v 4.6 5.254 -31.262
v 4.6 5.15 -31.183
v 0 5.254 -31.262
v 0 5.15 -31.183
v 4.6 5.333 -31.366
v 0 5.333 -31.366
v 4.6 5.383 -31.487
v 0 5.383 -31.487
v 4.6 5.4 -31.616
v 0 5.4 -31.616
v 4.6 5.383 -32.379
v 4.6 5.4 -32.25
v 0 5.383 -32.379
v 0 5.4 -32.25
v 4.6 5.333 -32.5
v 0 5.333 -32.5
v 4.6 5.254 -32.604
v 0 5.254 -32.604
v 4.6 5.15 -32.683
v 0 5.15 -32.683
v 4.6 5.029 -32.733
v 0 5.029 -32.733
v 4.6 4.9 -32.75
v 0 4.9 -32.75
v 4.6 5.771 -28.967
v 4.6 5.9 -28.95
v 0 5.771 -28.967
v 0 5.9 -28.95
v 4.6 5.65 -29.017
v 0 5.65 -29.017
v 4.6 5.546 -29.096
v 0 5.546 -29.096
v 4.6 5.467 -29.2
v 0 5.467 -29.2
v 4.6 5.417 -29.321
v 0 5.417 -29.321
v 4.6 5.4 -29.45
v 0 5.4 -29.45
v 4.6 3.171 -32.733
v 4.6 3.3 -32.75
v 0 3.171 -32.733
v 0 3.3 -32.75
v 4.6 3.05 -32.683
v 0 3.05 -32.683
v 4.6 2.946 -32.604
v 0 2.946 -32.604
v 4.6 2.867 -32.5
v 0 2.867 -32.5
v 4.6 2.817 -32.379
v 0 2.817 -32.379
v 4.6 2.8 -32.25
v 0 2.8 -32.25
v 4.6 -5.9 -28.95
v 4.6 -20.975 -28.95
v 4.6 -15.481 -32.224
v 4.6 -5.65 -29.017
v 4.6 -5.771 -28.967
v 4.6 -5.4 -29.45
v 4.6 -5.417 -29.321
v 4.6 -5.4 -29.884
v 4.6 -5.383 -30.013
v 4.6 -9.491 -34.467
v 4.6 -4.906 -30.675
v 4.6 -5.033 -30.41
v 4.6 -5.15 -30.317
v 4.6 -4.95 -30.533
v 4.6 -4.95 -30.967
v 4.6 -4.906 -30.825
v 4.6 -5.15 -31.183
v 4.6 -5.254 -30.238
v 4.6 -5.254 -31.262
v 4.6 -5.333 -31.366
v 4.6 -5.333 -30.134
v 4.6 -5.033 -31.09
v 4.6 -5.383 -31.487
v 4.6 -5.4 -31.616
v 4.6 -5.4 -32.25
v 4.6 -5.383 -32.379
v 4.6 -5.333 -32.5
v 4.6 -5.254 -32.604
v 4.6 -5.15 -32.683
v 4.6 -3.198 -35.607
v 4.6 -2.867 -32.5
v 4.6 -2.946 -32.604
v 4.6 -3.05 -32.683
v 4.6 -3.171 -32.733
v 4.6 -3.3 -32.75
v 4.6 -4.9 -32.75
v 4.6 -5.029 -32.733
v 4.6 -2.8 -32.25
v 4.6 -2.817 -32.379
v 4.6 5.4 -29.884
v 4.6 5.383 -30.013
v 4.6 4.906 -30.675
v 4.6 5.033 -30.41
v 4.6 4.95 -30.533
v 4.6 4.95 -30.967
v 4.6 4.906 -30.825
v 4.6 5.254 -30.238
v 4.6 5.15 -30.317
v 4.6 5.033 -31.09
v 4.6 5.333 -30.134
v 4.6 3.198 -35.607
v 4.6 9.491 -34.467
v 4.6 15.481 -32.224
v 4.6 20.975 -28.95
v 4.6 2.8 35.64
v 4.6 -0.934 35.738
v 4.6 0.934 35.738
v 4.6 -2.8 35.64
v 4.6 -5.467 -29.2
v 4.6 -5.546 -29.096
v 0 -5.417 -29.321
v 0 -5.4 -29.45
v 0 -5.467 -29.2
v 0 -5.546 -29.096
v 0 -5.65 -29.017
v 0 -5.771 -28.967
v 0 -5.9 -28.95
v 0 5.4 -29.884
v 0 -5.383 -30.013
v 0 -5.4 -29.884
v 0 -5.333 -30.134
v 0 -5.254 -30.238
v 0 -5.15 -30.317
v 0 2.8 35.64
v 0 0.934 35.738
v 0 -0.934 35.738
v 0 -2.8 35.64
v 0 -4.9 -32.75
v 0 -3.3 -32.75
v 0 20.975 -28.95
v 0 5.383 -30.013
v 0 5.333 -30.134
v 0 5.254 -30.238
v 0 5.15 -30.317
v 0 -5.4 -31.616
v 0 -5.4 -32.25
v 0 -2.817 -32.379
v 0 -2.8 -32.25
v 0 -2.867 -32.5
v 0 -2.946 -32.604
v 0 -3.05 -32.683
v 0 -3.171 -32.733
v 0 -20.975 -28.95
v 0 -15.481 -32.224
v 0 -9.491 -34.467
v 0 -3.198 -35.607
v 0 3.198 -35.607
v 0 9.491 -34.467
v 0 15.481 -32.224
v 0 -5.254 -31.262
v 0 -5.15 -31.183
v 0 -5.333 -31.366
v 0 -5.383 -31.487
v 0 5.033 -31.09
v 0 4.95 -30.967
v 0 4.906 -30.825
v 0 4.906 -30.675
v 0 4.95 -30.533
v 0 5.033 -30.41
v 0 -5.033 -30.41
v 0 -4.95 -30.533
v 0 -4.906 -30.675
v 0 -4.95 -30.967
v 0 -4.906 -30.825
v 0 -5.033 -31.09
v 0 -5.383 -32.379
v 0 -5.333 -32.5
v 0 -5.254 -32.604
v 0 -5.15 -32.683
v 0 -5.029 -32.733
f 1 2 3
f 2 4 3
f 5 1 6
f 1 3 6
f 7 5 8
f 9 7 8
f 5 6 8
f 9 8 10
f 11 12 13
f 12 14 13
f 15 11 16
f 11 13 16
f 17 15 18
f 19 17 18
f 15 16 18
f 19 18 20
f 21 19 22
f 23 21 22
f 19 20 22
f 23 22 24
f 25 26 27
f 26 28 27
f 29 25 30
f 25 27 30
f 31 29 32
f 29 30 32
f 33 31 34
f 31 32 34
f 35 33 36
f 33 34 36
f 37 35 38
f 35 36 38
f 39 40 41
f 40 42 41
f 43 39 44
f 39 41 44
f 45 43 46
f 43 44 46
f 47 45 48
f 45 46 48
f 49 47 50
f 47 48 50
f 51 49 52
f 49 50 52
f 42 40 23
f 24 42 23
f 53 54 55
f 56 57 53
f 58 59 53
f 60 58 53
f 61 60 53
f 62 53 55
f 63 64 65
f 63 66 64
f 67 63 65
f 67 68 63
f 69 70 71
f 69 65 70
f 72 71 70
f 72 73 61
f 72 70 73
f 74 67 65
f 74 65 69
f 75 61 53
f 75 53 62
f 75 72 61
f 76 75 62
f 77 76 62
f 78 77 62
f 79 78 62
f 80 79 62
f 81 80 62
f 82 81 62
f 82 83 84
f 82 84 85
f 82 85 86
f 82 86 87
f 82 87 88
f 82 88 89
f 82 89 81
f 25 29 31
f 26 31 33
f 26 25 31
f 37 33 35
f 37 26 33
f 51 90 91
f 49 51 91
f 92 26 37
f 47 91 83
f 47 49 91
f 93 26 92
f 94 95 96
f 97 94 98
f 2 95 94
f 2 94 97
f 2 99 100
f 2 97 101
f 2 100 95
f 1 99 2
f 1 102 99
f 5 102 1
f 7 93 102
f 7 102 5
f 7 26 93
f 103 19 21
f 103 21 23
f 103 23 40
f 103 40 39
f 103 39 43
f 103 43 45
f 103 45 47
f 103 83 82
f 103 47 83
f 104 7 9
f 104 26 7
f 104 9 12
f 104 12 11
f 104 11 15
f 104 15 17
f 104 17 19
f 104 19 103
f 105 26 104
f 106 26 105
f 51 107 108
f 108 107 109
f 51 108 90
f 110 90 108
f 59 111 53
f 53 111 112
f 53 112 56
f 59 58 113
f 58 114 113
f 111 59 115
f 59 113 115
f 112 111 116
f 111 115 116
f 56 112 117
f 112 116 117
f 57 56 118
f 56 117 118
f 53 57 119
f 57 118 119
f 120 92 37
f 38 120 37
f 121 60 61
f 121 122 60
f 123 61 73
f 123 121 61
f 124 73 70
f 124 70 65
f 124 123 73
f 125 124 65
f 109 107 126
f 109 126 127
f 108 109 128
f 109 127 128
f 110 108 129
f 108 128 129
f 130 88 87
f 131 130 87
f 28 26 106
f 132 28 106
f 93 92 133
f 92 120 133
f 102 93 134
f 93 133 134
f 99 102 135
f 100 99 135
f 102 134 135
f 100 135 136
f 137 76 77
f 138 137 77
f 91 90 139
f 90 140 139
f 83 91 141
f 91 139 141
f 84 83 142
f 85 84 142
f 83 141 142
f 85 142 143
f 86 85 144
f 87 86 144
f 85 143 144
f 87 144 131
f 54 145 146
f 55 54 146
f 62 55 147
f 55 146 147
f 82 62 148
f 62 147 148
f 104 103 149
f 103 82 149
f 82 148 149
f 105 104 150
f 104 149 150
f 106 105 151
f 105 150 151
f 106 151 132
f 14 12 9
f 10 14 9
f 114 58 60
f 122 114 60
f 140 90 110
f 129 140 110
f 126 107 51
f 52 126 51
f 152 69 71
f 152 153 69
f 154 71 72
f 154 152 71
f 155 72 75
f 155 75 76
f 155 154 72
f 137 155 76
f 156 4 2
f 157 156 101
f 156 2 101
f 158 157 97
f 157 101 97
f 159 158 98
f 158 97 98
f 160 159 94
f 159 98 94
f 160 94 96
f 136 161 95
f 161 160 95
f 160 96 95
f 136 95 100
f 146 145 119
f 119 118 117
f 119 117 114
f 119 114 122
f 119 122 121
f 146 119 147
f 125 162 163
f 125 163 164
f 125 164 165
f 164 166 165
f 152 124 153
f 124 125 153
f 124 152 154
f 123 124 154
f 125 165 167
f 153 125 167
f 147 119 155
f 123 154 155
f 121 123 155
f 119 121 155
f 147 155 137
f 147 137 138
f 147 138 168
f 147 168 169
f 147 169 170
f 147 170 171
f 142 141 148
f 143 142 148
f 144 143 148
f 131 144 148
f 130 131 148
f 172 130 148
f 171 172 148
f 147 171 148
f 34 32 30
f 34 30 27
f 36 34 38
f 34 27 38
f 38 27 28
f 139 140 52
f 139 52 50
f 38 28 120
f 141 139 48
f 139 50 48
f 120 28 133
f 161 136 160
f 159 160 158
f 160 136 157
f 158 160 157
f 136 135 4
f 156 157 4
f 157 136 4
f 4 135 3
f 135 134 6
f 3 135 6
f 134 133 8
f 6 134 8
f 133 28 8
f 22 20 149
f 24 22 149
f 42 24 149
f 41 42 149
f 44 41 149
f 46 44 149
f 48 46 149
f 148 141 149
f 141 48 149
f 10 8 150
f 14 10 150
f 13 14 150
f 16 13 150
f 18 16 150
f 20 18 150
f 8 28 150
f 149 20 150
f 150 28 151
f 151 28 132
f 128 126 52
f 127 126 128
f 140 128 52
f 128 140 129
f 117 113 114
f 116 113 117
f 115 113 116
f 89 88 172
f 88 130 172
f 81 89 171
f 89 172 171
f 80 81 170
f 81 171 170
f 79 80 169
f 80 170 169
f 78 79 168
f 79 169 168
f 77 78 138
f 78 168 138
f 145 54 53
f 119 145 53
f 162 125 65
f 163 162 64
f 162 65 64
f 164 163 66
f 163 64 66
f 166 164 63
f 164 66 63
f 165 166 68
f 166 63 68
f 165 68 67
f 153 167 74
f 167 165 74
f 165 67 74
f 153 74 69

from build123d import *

# Parameters (mm, degrees)
SKETCH1_R           = 35.75
BOSS_EXTRUDE1_DEPTH = 4.6
CUT_EXTRUDE1_DEPTH  = 51.766967607
FILLET1_R           = 0.5
FILLET2_R           = 0.5


with BuildPart() as part:
    # Sketch1 → Boss-Extrude1 (new body)
    with BuildSketch(Plane(origin=(0, 0, 0), x_dir=(0, 0, -1), z_dir=(1, 0, 0))):
        Circle(SKETCH1_R)
    extrude(amount=BOSS_EXTRUDE1_DEPTH)

    # Sketch2 → Cut-Extrude1 (cut, through all)
    with BuildSketch(Plane(origin=(4.6, 0, 0), x_dir=(0, 0, -1), z_dir=(1, 0, 0))):
        with BuildLine():
            Line((28.95, 5.4), (28.95, 20.975223479))
            ThreePointArc((28.95, 20.975223479), (-9.683714035, 34.41348838), (-35.640180976, 2.8))
            Line((-35.640180976, 2.8), (28.95, 2.8))
            Line((28.95, 2.8), (28.95, 5.4))
        make_face()
        with BuildLine():
            ThreePointArc((-35.640180976, -2.8), (-9.683714035, -34.41348838), (28.95, -20.975223479))
            Line((28.95, -20.975223479), (28.95, -5.4))
            Line((28.95, -5.4), (28.95, -2.8))
            Line((28.95, -2.8), (-35.640180976, -2.8))
        make_face()
        with BuildLine():
            Line((28.95, 2.8), (32.75, 2.8))
            Line((32.75, 2.8), (32.75, 5.4))
            Line((32.75, 5.4), (31.25, 5.4))
            ThreePointArc((31.25, 5.4), (30.75, 4.9), (30.25, 5.4))
            Line((30.25, 5.4), (28.95, 5.4))
            Line((28.95, 5.4), (28.95, 2.8))
        make_face()
        with BuildLine():
            Line((32.75, -5.4), (32.75, -2.8))
            Line((32.75, -2.8), (28.95, -2.8))
            Line((28.95, -2.8), (28.95, -5.4))
            Line((28.95, -5.4), (30.25, -5.4))
            ThreePointArc((30.25, -5.4), (30.75, -4.9), (31.25, -5.4))
            Line((31.25, -5.4), (32.75, -5.4))
        make_face()
    extrude(amount=-CUT_EXTRUDE1_DEPTH, mode=Mode.SUBTRACT)

    # Fillet1
    fillet1_edges = [part.edges().sort_by_distance(p)[0] for p in [
        (2.3, 5.4, -28.95),
        (2.3, 5.4, -32.75),
        (2.3, 2.8, -32.75),
        (2.3, -5.4, -28.95),
        (2.3, -2.8, -32.75),
        (2.3, -5.4, -32.75),
    ]]
    fillet(fillet1_edges, radius=FILLET1_R)

    # Fillet2
    fillet2_edges = [part.edges().sort_by_distance(p)[0] for p in [
        (2.3, 5.4, -30.25),
        (2.3, 5.4, -31.25),
        (2.3, -5.4, -31.25),
        (2.3, -5.4, -30.25),
    ]]
    fillet(fillet2_edges, radius=FILLET2_R)


solid = part.part
